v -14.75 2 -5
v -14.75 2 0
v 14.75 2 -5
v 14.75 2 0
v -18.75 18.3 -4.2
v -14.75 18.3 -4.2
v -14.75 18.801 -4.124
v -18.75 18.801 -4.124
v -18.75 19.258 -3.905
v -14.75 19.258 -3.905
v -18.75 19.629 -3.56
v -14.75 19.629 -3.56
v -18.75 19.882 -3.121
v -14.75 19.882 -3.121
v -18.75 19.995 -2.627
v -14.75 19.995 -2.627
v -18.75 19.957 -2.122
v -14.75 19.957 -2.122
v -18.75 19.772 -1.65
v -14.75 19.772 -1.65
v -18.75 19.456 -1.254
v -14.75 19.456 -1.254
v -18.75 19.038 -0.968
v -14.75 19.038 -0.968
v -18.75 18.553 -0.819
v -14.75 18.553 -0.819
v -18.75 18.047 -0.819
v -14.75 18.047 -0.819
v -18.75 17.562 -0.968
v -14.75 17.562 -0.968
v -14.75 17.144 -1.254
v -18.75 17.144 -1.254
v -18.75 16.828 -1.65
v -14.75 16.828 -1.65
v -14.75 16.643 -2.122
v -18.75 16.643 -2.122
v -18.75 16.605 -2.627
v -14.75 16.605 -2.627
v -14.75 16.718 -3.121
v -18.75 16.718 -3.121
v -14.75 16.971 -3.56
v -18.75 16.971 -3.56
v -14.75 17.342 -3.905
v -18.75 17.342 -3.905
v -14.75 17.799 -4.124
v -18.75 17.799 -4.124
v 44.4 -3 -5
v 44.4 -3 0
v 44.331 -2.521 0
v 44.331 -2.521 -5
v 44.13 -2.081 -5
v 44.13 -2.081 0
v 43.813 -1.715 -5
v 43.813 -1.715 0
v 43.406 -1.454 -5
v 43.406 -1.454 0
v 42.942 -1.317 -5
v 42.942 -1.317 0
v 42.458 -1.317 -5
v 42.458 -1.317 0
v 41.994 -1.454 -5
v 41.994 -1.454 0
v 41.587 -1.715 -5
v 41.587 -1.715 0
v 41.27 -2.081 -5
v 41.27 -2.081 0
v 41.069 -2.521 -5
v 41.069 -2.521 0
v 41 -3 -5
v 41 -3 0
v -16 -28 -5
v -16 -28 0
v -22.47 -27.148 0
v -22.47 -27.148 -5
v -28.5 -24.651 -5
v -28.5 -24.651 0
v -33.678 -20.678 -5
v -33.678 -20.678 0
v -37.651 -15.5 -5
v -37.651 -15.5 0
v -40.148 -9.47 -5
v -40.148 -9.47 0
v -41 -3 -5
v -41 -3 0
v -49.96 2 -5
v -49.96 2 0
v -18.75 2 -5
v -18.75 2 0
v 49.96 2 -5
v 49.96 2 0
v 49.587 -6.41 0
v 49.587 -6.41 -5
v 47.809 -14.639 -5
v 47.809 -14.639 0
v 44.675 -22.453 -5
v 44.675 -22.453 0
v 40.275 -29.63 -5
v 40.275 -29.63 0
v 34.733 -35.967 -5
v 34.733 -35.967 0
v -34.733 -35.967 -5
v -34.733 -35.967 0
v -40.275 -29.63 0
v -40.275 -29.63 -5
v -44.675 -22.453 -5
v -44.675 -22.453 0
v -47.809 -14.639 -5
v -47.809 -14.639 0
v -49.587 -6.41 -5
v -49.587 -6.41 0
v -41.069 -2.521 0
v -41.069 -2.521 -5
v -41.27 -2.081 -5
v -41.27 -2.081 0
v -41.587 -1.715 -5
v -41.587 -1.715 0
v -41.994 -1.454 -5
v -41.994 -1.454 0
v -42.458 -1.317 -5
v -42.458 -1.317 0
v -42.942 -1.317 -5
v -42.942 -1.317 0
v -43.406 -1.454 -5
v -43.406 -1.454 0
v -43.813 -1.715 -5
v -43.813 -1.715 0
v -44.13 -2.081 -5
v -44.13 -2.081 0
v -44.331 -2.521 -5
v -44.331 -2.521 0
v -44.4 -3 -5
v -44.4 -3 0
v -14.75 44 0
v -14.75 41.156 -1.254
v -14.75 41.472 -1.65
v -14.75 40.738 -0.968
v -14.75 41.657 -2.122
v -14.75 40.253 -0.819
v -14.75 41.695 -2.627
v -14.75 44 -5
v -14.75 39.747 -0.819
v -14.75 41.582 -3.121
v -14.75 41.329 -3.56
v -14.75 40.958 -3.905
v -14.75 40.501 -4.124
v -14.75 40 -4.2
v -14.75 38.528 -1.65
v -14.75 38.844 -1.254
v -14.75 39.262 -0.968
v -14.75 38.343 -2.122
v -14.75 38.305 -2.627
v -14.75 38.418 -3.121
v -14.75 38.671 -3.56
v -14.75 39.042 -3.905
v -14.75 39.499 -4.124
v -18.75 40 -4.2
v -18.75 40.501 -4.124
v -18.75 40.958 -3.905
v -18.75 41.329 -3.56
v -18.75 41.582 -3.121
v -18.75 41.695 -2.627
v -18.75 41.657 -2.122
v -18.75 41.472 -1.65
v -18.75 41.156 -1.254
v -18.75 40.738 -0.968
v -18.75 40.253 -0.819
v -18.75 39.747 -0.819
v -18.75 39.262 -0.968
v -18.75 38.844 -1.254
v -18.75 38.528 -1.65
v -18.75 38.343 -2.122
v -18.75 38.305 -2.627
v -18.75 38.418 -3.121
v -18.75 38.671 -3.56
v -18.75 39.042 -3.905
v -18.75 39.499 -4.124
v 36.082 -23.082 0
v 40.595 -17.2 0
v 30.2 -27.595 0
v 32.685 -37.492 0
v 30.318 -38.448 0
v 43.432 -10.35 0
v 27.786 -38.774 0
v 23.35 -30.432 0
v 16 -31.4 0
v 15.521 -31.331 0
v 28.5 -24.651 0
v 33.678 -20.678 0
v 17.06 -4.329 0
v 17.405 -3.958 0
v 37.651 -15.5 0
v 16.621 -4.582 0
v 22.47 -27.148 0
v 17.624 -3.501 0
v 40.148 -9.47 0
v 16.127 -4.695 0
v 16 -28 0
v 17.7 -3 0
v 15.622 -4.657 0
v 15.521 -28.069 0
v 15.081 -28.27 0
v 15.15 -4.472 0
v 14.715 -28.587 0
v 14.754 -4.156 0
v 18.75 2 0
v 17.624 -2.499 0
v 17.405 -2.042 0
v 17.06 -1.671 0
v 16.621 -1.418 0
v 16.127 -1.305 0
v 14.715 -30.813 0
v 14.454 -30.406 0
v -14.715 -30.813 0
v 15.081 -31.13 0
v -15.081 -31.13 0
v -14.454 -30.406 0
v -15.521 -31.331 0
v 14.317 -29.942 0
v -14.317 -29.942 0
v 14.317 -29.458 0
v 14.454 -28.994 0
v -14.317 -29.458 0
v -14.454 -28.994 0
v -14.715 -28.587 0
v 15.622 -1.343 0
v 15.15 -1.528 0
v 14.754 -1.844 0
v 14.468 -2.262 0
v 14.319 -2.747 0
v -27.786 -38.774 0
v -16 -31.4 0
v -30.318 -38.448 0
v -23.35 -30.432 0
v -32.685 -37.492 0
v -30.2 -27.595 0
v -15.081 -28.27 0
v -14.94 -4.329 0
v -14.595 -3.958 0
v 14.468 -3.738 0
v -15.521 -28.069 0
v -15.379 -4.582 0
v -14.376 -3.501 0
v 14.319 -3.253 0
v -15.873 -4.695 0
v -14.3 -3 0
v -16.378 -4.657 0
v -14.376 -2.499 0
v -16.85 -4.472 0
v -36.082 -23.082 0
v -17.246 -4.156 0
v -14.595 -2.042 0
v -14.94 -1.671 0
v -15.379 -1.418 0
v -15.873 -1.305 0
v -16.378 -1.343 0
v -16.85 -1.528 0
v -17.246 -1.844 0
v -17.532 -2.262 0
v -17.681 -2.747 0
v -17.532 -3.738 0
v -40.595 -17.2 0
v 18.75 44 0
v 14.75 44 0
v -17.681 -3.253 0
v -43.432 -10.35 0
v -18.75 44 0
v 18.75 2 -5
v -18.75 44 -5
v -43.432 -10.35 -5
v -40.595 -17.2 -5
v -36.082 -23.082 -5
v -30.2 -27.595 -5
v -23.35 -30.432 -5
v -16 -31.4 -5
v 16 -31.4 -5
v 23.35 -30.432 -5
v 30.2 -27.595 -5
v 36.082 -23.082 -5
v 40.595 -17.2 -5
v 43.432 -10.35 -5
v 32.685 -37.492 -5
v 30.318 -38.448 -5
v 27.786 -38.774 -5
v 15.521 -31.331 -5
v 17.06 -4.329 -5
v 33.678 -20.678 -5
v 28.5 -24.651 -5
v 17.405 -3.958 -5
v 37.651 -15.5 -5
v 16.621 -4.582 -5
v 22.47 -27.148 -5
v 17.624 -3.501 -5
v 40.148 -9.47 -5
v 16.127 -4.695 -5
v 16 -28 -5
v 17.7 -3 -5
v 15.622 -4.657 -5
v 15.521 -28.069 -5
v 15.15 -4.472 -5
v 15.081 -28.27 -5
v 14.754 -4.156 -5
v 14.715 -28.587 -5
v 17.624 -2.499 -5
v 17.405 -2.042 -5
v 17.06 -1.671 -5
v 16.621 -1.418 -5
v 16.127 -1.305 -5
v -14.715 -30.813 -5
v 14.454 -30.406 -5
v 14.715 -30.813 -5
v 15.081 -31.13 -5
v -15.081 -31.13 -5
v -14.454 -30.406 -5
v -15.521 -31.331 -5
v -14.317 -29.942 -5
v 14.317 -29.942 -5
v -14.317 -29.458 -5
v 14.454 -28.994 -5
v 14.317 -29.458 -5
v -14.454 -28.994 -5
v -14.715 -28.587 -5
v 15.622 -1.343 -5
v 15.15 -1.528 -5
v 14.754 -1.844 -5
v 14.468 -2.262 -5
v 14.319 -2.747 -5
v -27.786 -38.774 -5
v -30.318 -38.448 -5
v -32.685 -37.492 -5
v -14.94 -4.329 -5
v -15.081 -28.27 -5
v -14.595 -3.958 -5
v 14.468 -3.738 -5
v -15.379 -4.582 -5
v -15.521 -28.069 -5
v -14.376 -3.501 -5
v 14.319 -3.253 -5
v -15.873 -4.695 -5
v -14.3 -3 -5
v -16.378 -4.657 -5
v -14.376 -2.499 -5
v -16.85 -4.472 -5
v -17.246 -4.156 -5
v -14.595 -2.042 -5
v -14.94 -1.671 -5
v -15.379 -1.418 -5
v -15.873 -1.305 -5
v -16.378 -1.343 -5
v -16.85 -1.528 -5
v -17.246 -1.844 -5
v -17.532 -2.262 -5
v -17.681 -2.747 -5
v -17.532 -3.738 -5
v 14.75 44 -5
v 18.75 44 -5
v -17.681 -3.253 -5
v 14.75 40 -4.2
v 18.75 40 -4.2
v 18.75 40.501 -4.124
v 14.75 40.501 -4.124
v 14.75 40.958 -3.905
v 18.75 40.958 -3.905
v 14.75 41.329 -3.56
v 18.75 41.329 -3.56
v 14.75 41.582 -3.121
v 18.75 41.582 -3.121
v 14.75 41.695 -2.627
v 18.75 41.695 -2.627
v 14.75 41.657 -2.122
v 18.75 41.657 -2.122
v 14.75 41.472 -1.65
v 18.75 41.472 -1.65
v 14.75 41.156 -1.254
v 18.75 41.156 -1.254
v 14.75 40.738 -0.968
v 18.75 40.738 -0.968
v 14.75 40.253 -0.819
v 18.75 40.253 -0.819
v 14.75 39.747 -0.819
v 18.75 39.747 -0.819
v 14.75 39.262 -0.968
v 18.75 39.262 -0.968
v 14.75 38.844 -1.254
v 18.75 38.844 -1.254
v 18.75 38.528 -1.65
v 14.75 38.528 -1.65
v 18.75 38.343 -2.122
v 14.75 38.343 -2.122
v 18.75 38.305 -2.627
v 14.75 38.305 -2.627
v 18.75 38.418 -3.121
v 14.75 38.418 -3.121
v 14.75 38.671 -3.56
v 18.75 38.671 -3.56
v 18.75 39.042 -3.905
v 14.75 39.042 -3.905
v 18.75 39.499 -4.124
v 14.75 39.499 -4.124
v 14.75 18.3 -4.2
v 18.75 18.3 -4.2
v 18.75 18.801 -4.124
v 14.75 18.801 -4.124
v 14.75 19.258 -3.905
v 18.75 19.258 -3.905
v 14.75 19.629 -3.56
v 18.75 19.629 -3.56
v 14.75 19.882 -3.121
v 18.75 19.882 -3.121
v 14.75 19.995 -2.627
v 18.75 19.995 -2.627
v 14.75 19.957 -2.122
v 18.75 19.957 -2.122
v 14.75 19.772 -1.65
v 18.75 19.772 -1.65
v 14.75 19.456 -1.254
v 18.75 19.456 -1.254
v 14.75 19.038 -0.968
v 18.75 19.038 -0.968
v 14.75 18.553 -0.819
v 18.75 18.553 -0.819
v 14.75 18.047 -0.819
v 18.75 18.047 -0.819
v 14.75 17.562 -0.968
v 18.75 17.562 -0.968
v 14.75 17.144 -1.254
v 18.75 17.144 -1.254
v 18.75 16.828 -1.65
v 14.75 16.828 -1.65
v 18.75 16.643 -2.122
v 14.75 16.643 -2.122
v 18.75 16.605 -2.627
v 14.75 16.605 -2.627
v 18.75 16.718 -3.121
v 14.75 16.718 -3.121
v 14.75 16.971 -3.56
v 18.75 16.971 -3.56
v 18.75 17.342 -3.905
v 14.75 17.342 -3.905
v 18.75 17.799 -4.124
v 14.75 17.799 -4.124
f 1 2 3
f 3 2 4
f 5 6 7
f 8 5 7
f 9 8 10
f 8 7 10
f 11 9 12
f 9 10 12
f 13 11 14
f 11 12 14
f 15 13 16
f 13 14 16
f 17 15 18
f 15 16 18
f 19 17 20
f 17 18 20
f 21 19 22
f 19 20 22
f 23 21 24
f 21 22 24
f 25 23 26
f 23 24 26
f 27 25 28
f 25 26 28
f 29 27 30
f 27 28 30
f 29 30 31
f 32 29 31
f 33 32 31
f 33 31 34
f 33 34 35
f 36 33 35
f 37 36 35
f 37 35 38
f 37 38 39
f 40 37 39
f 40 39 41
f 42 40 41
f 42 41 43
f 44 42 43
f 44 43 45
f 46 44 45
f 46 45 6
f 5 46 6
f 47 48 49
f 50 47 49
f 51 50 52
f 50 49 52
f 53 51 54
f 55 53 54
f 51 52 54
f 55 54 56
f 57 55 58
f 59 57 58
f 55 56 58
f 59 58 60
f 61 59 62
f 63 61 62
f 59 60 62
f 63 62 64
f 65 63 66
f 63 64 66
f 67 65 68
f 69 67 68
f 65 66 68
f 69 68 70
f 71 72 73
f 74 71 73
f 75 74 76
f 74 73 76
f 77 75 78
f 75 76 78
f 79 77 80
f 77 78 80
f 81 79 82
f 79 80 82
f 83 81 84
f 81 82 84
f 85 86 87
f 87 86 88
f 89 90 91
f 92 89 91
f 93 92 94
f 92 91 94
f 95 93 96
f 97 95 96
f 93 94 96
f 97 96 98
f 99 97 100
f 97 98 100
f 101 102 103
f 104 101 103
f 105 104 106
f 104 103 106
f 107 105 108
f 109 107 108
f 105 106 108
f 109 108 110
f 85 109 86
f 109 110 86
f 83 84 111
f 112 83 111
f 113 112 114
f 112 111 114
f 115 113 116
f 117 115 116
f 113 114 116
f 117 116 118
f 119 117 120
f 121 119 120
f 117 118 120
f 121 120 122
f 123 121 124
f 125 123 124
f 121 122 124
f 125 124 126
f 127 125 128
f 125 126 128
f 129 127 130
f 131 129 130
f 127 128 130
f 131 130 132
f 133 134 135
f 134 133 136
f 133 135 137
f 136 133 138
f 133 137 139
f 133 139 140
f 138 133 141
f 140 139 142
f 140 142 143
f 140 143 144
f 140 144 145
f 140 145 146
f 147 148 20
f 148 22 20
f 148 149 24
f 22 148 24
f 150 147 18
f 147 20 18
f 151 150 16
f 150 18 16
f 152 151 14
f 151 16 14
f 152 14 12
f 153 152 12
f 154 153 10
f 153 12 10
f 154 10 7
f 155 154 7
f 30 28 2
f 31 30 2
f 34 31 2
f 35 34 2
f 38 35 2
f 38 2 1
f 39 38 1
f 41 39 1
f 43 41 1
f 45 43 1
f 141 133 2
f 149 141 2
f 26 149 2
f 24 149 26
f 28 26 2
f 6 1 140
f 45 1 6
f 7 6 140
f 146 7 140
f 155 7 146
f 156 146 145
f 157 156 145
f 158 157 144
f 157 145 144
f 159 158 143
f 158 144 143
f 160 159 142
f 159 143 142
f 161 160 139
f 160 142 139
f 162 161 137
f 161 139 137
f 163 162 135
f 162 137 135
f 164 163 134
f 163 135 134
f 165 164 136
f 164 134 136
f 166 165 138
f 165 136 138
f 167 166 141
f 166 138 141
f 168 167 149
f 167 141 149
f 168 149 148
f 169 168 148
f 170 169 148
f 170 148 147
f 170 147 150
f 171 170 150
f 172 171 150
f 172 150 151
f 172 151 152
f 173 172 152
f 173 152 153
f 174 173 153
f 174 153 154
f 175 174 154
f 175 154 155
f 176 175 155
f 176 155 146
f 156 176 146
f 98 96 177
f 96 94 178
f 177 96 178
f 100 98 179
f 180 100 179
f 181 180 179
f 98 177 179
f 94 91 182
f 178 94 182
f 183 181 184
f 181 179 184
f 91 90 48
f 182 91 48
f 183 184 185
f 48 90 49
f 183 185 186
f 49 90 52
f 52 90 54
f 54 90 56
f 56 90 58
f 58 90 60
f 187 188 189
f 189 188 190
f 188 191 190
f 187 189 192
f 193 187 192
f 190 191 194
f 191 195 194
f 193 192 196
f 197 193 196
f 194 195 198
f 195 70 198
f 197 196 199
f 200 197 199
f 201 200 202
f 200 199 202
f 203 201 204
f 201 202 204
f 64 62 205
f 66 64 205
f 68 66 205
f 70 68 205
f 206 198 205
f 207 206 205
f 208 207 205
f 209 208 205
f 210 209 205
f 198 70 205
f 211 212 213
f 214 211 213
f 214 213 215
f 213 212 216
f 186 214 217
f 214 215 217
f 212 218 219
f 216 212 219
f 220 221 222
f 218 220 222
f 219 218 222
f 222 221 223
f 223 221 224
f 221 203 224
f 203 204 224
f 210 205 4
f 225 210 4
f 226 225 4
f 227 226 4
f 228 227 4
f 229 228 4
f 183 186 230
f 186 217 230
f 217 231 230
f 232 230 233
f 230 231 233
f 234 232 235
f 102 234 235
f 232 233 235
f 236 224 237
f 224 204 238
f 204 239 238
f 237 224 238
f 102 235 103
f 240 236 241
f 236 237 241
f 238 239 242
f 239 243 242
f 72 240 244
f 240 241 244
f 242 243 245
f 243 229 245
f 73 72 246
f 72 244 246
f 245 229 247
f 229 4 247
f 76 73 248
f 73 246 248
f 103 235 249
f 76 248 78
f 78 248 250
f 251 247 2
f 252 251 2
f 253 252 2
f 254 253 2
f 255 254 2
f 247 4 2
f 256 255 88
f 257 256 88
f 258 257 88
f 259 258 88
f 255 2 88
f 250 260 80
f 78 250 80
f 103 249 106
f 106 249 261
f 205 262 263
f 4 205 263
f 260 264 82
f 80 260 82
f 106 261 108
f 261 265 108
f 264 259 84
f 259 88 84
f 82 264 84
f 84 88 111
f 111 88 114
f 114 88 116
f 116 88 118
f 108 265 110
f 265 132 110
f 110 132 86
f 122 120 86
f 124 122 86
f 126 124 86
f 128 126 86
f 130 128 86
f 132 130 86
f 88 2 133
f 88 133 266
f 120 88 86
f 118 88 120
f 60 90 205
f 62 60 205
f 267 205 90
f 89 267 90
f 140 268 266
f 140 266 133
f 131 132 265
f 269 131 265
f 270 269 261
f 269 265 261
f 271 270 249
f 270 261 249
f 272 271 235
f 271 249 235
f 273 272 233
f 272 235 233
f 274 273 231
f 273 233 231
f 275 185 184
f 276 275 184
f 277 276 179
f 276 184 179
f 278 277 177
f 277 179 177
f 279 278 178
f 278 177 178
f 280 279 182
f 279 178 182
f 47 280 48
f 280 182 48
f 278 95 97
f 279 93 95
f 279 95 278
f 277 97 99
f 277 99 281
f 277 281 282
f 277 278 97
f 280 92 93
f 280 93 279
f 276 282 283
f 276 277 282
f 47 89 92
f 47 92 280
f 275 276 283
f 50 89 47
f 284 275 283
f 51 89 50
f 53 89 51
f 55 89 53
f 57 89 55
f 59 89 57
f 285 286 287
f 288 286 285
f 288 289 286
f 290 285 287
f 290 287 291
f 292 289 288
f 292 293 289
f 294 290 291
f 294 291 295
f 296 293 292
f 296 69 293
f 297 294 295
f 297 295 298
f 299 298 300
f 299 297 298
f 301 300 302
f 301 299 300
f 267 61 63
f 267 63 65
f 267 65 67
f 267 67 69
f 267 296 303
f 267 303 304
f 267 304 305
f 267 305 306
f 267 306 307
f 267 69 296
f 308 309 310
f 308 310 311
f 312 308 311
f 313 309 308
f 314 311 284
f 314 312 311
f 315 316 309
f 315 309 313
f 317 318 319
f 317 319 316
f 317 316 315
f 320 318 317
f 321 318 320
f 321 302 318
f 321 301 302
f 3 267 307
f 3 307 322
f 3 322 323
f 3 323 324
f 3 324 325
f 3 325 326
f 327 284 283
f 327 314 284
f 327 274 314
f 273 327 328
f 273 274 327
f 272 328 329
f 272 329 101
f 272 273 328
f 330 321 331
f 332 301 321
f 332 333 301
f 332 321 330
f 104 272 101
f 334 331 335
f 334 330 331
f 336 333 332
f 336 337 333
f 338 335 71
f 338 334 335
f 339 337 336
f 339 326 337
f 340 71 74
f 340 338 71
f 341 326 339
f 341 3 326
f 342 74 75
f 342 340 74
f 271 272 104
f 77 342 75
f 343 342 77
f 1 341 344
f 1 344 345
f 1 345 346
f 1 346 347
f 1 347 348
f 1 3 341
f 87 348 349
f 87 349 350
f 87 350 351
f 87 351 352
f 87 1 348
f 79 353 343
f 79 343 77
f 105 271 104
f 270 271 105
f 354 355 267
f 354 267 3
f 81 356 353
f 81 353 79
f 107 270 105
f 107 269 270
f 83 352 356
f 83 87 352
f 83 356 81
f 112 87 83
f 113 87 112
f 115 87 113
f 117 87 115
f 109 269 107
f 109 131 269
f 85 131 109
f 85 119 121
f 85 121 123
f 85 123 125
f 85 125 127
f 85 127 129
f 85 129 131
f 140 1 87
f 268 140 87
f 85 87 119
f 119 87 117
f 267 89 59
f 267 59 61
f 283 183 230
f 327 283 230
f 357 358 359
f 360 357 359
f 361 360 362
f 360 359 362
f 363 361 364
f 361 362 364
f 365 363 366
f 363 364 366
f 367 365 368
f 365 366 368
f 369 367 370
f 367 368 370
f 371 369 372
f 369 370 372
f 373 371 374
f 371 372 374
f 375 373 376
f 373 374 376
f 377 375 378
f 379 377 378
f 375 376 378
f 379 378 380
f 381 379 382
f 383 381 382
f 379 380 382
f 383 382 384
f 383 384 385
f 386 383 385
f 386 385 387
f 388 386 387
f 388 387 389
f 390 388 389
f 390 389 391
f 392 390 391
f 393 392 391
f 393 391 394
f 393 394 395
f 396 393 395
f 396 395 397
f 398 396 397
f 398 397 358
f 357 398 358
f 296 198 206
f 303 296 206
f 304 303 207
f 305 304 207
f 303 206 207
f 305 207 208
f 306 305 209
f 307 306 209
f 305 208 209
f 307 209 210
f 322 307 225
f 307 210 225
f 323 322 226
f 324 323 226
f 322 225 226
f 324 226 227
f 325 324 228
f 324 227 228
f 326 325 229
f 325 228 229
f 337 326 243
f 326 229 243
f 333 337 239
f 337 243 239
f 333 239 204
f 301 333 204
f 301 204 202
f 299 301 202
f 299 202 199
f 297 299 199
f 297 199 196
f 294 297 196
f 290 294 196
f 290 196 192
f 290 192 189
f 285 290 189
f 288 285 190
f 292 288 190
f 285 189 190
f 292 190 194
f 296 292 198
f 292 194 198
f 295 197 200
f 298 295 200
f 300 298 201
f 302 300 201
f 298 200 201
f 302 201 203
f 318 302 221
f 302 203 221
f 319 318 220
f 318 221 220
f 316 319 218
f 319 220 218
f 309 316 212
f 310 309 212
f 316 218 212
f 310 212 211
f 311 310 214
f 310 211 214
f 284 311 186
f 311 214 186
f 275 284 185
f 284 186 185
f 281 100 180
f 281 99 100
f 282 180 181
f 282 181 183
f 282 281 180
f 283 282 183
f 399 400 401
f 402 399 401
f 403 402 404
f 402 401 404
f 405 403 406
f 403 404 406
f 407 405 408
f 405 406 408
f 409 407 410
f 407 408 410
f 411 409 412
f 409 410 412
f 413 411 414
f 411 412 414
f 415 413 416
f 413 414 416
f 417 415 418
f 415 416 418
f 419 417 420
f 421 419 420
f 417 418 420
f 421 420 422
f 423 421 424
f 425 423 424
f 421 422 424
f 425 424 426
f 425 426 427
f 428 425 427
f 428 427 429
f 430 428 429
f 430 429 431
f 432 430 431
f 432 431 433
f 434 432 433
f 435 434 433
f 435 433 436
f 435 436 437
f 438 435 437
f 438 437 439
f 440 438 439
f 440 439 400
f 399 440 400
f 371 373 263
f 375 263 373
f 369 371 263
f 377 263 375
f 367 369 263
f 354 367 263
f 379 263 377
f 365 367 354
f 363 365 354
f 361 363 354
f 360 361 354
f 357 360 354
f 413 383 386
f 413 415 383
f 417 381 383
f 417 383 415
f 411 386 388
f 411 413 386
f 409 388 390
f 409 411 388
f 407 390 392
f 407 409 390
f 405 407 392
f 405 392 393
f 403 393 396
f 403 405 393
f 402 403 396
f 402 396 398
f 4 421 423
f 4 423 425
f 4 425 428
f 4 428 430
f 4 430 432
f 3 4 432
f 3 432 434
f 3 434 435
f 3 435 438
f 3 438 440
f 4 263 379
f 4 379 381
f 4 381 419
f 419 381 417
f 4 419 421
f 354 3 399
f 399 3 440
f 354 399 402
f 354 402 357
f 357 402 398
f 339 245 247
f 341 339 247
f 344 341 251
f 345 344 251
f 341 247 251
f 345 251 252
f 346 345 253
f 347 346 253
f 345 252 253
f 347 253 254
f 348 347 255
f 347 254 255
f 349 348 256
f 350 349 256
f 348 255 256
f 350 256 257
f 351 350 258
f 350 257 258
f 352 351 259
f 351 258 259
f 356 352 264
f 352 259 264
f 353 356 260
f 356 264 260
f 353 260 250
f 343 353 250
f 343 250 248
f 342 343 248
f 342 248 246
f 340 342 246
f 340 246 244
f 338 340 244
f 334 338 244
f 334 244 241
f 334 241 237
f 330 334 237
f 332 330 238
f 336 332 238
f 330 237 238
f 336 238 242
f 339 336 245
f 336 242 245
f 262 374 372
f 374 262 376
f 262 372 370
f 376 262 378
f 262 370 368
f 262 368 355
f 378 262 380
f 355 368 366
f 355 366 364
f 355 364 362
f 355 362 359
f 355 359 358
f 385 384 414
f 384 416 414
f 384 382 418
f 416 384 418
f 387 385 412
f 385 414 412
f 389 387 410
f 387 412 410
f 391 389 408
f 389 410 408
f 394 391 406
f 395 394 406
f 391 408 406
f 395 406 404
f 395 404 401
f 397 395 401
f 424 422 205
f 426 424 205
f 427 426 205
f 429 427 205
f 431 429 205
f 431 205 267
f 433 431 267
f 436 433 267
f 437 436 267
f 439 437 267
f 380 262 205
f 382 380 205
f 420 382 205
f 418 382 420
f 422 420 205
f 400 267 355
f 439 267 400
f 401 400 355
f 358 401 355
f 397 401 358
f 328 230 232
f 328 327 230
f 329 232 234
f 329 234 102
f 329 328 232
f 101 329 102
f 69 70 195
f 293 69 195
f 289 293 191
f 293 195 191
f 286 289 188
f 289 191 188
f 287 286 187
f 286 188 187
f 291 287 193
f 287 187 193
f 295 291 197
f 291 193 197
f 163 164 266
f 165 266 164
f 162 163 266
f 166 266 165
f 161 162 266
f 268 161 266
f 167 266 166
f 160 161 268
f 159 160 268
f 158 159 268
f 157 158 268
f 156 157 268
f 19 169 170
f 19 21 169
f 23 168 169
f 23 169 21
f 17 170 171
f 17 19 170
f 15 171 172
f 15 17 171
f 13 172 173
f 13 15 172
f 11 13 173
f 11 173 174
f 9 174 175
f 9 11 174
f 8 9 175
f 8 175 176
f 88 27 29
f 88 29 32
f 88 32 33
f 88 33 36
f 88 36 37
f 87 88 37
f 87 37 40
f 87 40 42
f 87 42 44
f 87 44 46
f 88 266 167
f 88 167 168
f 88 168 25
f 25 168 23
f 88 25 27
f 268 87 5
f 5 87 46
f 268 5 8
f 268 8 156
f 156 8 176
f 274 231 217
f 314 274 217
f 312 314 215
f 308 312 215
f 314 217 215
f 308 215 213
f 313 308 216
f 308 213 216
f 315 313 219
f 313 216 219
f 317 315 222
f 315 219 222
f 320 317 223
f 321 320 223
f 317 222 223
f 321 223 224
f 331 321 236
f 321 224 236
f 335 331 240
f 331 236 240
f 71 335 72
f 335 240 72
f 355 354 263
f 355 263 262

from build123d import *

# Parameters (mm, degrees)
SKETCH1_R           = 1.7
BOSS_EXTRUDE1_DEPTH = 5
SKETCH2_W           = 4
SKETCH2_H           = 5
BOSS_EXTRUDE2_DEPTH = 42
SKETCH3_R           = 1.7
CUT_EXTRUDE1_DEPTH  = 69.75
FILLET1_R           = 10
FILLET2_R           = 10


with BuildPart() as part:
    # Sketch1 → Boss-Extrude1 (new body)
    with BuildSketch(Plane.XY):
        with BuildLine():
            Line((-49.959983987, 2), (49.959983987, 2))
            ThreePointArc((49.959983987, 2), (45.578077054, -20.558183092), (31.568754239, -38.773879814))
            Line((31.568754239, -38.773879814), (-31.568754239, -38.773879814))
            ThreePointArc((-31.568754239, -38.773879814), (-45.578077054, -20.558183092), (-49.959983987, 2))
        make_face()
        with Locations((-16, -3)):
            Circle(SKETCH1_R, mode=Mode.SUBTRACT)
        with Locations((16, -3)):
            Circle(SKETCH1_R, mode=Mode.SUBTRACT)
        with BuildLine():
            ThreePointArc((-44.4, -3), (-36.081832586, -23.081832586), (-16, -31.4))
            ThreePointArc((-16, -31.4), (-14.3, -29.7), (-16, -28))
            ThreePointArc((-16, -28), (-33.67766953, -20.67766953), (-41, -3))
            ThreePointArc((-41, -3), (-42.7, -1.3), (-44.4, -3))
        make_face(mode=Mode.SUBTRACT)
        with BuildLine():
            ThreePointArc((16, -31.4), (36.081832586, -23.081832586), (44.4, -3))
            ThreePointArc((44.4, -3), (42.7, -1.3), (41, -3))
            ThreePointArc((41, -3), (33.67766953, -20.67766953), (16, -28))
            ThreePointArc((16, -28), (14.3, -29.7), (16, -31.4))
        make_face(mode=Mode.SUBTRACT)
    extrude(amount=-BOSS_EXTRUDE1_DEPTH)

    # Sketch2 → Boss-Extrude2 (add)
    with BuildSketch(Plane(origin=(0, 2, 0), x_dir=(1, 0, 0), z_dir=(0, 1, 0))):
        with Locations((16.75, 2.5)):
            Rectangle(SKETCH2_W, SKETCH2_H)
        with Locations((-16.75, 2.5)):
            Rectangle(SKETCH2_W, SKETCH2_H)
    extrude(amount=BOSS_EXTRUDE2_DEPTH)

    # Sketch3 → Cut-Extrude1 (cut, through all)
    with BuildSketch(Plane(origin=(18.75, 0, 0), x_dir=(0, 0, -1), z_dir=(1, 0, 0))):
        with Locations((2.5, 40)):
            Circle(SKETCH3_R)
        with Locations((2.5, 18.3)):
            Circle(SKETCH3_R)
    extrude(amount=-CUT_EXTRUDE1_DEPTH, mode=Mode.SUBTRACT)

    # Fillet1
    fillet1_edges = [part.edges().sort_by_distance(p)[0] for p in [
        (31.568754239, -38.773879814, -2.5),
    ]]
    fillet(fillet1_edges, radius=FILLET1_R)

    # Fillet2
    fillet2_edges = [part.edges().sort_by_distance(p)[0] for p in [
        (-31.568754239, -38.773879814, -2.5),
    ]]
    fillet(fillet2_edges, radius=FILLET2_R)


solid = part.part
